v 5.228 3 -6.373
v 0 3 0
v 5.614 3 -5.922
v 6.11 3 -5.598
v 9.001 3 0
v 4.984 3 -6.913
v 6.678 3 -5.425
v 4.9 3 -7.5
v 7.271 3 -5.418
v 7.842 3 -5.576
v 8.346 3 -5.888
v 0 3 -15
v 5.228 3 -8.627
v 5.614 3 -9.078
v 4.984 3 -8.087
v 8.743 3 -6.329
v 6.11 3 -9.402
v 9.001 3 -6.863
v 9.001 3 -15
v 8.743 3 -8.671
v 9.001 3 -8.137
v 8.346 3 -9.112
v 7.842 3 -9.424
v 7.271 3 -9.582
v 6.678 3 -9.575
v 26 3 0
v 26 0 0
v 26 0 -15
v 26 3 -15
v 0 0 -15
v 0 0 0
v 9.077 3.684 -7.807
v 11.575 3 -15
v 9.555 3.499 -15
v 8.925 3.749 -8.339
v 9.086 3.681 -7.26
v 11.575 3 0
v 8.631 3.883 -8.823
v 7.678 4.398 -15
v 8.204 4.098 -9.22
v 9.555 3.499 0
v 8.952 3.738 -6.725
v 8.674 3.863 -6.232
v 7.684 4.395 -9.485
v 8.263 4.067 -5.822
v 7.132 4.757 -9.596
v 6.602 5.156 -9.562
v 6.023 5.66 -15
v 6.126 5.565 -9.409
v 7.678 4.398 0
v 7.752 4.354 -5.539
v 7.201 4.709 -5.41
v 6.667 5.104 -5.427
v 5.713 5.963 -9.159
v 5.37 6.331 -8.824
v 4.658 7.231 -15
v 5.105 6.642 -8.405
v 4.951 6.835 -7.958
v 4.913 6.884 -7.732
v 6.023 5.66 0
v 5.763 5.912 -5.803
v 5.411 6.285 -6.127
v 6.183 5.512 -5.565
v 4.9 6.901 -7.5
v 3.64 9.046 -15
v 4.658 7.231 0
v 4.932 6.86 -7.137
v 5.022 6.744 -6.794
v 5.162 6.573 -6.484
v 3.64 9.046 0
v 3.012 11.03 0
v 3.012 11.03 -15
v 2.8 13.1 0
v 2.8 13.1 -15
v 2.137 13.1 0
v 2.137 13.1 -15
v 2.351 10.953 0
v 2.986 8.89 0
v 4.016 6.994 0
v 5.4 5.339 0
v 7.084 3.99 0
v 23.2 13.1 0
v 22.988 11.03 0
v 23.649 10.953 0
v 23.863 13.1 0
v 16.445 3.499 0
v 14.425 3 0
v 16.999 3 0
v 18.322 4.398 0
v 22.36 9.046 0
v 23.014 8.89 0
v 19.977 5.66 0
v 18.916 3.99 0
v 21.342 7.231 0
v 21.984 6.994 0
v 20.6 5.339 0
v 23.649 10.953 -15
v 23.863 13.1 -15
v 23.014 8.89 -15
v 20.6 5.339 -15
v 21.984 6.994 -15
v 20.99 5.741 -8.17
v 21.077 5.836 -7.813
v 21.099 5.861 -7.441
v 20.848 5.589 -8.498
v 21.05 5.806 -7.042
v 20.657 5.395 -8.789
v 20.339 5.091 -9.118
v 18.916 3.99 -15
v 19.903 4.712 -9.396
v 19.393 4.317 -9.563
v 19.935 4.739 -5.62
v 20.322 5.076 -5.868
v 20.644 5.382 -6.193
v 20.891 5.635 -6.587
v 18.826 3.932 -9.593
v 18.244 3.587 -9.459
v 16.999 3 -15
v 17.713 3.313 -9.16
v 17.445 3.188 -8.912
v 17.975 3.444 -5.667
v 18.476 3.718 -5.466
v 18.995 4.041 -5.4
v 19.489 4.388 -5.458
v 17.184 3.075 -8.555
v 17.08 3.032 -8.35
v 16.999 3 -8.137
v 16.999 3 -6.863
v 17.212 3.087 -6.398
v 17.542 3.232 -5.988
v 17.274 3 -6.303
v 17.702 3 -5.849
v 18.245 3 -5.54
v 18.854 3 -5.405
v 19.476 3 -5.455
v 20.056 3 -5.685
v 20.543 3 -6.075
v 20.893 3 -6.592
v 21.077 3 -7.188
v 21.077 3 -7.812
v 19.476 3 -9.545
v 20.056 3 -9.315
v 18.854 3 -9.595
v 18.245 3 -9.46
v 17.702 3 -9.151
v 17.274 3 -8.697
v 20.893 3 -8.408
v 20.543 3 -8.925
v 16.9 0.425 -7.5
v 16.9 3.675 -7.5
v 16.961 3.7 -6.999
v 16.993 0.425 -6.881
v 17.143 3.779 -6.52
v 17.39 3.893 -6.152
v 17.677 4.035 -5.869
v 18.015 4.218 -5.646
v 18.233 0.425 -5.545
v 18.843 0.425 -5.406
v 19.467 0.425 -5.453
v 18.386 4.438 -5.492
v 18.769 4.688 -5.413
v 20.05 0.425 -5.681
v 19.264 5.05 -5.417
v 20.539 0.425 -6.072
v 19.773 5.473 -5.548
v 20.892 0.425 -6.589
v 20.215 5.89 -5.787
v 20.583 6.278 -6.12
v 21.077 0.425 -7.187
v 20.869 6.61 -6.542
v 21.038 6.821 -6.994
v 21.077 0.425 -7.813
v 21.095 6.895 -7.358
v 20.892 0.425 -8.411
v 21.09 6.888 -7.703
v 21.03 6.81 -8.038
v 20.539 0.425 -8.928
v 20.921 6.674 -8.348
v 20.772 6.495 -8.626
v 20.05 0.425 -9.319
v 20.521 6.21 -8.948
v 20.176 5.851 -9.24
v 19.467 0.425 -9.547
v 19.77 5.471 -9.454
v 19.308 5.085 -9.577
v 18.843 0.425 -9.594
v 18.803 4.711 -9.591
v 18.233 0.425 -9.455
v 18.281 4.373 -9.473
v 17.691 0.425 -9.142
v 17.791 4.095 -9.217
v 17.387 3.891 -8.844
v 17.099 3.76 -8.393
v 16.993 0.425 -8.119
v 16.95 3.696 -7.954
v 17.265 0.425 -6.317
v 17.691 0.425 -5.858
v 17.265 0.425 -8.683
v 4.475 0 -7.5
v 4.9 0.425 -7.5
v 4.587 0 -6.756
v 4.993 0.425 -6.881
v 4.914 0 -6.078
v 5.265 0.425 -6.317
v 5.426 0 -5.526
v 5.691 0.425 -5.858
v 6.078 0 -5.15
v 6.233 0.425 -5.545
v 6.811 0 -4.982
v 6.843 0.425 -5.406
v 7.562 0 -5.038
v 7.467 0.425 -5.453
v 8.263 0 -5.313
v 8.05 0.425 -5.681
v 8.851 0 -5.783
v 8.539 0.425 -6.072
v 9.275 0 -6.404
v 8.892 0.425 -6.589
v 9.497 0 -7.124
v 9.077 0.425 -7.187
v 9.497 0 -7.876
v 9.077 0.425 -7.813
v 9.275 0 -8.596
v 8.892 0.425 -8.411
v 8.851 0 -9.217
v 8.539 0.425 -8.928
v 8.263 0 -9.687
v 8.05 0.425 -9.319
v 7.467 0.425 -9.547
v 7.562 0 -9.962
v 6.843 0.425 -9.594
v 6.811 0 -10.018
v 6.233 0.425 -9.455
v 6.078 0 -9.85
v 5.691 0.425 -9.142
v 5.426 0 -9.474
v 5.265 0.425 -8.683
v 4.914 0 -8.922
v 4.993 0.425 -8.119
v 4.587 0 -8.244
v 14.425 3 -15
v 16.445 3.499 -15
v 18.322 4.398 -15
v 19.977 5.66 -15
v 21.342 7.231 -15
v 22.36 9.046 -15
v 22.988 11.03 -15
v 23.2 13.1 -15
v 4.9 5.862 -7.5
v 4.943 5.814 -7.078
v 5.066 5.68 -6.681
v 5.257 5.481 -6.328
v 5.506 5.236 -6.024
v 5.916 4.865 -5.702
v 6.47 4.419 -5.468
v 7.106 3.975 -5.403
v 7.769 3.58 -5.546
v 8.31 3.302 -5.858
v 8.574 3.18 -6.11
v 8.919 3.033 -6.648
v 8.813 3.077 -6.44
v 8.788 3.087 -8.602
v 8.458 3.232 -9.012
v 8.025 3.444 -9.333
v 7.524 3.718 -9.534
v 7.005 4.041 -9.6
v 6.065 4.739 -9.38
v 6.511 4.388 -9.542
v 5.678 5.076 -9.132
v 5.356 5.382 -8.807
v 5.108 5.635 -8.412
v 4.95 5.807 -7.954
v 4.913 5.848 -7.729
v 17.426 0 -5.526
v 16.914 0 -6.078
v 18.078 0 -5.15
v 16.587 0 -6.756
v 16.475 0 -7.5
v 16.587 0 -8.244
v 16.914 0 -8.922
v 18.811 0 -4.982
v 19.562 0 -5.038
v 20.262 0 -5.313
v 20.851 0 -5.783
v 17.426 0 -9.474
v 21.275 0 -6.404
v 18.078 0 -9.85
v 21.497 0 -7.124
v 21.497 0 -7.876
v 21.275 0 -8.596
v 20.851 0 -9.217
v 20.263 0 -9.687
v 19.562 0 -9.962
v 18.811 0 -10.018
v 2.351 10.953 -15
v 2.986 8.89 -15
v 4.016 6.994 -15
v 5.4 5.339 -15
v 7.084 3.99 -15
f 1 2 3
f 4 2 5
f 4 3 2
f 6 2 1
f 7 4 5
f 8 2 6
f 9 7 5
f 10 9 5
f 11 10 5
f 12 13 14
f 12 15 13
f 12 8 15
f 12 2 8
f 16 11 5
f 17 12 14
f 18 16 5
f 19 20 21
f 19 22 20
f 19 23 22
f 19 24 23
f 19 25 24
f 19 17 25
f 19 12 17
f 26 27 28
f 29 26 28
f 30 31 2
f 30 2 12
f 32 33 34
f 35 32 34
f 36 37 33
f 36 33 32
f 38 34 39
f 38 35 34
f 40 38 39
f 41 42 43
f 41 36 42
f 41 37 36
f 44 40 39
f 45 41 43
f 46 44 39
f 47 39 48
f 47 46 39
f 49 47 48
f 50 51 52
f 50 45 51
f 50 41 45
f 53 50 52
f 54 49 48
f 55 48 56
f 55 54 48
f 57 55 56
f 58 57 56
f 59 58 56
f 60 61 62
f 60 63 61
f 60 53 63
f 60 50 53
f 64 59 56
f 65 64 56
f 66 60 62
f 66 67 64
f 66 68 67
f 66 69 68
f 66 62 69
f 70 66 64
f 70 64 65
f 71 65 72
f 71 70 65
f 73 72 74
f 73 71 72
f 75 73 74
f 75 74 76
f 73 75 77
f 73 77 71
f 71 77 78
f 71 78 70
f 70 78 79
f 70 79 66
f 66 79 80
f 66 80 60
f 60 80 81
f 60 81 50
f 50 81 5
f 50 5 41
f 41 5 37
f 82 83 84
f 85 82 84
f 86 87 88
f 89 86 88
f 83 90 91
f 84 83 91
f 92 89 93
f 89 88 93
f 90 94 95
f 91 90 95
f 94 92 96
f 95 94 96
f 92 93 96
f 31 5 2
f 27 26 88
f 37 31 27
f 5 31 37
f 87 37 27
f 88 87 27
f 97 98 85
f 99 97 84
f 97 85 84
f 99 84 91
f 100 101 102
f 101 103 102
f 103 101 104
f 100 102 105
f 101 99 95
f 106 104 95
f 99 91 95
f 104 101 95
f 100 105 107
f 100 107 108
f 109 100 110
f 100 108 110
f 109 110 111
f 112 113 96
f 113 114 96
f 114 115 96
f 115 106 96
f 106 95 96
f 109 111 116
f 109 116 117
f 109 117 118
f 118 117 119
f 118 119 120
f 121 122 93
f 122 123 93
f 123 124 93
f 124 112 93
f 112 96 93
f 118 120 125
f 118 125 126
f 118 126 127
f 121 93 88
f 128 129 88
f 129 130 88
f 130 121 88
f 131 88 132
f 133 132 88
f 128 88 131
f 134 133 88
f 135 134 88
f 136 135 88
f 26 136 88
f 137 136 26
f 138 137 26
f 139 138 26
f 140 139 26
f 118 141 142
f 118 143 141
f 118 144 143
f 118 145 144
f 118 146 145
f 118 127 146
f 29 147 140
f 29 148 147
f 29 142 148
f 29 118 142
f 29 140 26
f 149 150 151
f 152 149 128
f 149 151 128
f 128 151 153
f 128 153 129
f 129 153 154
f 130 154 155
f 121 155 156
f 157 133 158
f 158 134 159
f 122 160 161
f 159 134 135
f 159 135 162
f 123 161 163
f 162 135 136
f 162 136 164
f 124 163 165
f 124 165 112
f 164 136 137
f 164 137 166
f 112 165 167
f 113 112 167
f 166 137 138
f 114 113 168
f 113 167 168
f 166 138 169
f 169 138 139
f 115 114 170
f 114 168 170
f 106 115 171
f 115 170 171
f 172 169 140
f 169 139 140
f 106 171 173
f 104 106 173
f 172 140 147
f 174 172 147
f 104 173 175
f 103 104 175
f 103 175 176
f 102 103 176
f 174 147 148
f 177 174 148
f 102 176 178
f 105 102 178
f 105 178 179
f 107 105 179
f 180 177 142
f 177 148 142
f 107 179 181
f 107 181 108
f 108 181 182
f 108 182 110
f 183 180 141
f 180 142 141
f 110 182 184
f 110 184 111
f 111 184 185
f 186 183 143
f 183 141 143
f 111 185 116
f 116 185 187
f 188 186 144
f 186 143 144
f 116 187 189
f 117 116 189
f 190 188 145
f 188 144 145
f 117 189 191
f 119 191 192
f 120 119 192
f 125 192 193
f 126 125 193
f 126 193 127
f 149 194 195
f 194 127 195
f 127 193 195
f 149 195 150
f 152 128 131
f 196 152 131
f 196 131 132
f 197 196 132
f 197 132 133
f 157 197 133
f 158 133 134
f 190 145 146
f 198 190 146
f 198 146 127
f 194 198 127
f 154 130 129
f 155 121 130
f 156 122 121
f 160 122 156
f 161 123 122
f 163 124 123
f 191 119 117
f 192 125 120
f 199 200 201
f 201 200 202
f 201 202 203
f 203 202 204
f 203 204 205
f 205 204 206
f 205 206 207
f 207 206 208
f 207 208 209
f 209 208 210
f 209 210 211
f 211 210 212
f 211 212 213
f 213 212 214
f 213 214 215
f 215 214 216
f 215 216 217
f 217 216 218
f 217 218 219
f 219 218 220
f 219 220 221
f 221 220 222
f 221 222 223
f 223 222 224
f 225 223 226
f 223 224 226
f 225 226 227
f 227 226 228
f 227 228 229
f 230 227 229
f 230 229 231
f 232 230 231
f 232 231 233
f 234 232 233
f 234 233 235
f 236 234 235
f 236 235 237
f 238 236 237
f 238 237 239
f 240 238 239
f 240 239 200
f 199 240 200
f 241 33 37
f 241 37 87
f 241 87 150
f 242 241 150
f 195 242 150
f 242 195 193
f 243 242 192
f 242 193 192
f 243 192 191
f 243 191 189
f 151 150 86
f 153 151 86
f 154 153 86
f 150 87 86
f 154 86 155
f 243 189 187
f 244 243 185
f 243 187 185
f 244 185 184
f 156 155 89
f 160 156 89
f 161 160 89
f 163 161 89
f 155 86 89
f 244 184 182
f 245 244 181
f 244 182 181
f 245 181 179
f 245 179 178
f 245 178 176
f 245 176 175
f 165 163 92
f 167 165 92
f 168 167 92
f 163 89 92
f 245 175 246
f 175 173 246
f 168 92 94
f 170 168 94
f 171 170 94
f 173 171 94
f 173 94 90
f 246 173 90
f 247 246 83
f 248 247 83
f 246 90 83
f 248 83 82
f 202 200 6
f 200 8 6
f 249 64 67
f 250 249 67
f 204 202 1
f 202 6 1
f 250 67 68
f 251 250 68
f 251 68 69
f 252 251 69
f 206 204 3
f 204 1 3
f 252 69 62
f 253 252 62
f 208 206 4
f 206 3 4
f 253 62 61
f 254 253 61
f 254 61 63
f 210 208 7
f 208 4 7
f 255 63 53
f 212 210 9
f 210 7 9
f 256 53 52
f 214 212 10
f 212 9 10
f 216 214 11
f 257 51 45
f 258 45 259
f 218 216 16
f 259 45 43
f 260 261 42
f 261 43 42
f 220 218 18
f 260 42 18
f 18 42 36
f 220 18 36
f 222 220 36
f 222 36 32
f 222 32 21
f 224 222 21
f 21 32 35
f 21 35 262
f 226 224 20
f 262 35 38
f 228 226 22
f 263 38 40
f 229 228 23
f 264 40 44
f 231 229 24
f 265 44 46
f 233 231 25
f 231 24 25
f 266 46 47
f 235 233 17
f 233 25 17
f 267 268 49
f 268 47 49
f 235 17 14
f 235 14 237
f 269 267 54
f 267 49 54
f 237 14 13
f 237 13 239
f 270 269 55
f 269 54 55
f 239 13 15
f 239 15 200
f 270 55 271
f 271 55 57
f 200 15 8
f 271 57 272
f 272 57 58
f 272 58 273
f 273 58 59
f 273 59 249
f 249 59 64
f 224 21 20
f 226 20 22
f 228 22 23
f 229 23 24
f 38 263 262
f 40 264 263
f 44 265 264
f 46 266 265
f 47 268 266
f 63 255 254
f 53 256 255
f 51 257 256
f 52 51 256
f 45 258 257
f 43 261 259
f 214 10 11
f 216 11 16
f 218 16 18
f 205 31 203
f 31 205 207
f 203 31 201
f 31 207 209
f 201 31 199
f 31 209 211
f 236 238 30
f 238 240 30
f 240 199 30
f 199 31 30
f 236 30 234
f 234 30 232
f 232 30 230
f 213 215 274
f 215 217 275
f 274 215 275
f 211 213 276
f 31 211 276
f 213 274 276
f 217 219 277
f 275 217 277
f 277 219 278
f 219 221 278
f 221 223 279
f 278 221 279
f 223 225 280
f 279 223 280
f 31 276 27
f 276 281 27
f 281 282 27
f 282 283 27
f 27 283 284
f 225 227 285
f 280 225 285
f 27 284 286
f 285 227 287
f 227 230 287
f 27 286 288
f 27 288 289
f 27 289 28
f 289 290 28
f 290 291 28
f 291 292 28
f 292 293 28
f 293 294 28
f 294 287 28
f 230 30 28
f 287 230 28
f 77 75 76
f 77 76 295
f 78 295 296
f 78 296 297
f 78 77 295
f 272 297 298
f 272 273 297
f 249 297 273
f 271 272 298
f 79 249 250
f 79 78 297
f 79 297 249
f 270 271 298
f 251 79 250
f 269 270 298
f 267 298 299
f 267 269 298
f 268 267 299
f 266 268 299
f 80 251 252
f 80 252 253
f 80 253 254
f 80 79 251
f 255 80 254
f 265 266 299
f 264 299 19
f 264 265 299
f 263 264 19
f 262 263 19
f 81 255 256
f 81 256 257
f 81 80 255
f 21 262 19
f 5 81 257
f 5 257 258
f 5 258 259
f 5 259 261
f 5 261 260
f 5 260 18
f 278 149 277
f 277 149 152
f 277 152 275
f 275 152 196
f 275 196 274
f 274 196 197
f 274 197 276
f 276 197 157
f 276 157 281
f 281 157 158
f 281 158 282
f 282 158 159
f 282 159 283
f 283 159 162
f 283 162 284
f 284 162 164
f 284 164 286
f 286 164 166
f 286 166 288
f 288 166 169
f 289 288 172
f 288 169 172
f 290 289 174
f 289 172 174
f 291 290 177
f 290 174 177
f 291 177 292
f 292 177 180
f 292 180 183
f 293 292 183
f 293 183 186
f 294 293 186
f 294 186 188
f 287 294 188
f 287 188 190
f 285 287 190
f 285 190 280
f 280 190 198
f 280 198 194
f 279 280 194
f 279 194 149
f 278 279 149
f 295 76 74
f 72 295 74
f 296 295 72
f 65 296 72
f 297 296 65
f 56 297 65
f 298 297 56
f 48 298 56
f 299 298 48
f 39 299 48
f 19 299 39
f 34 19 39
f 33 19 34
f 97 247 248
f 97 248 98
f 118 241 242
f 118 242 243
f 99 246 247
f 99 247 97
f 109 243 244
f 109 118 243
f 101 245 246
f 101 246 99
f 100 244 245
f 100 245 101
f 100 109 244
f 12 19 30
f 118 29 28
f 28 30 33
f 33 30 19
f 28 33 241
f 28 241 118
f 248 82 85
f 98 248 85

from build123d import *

# Parameters (mm, degrees)
SKETCH_1_W                   = 26
SKETCH_1_H                   = 15
EXTRUDE_1_DEPTH              = 3
EXTRUDE_2_DEPTH              = 15
HOLE_WIZARD_M5_2_D           = 4.2
HOLE_WIZARD_M5_2_DEPTH       = 12.4
HOLE_WIZARD_M5_2_CSINK_D     = 5.05
HOLE_WIZARD_M5_2_CSINK_ANGLE = 90
HOLE_WIZARD_M5_2_TIP         = 1.2618073


with BuildPart() as part:
    # 草图1 → 凸台-拉伸1 (new body)
    with BuildSketch(Plane(origin=(0, 0, 0), x_dir=(1, 0, 0), z_dir=(0, 1, 0))):
        with Locations((13, 7.5)):
            Rectangle(SKETCH_1_W, SKETCH_1_H)
    extrude(amount=EXTRUDE_1_DEPTH)

    # 草图3 → 凸台-拉伸2 (add)
    with BuildSketch(Plane.XY):
        with BuildLine():
            Line((9.001058493, 3), (11.575219315, 3))
            ThreePointArc((11.575219315, 3), (5.300234972, 6.410185465), (2.8, 13.1))
            Line((2.8, 13.1), (2.137148939, 13.1))
            ThreePointArc((2.137148939, 13.1), (4.015528976, 6.994198366), (9.001058493, 3))
        make_face()
        with BuildLine():
            Line((23.2, 13.1), (23.862851061, 13.1))
            ThreePointArc((23.862851061, 13.1), (21.984471024, 6.994198366), (16.998941507, 3))
            Line((16.998941507, 3), (14.424780685, 3))
            ThreePointArc((14.424780685, 3), (20.699765028, 6.410185465), (23.2, 13.1))
        make_face()
    extrude(amount=-EXTRUDE_2_DEPTH)

    # M5 螺纹孔2
    with Locations(Plane.XZ):
        with Locations((7, -7.5), (19, -7.5)):
            CounterSinkHole(HOLE_WIZARD_M5_2_D / 2, HOLE_WIZARD_M5_2_CSINK_D / 2, depth=HOLE_WIZARD_M5_2_DEPTH, counter_sink_angle=HOLE_WIZARD_M5_2_CSINK_ANGLE)
            with Locations((0, 0, -(HOLE_WIZARD_M5_2_DEPTH + HOLE_WIZARD_M5_2_TIP / 2))):  # 118° drill point
                Cone(0, HOLE_WIZARD_M5_2_D / 2, HOLE_WIZARD_M5_2_TIP, mode=Mode.SUBTRACT)


solid = part.part
